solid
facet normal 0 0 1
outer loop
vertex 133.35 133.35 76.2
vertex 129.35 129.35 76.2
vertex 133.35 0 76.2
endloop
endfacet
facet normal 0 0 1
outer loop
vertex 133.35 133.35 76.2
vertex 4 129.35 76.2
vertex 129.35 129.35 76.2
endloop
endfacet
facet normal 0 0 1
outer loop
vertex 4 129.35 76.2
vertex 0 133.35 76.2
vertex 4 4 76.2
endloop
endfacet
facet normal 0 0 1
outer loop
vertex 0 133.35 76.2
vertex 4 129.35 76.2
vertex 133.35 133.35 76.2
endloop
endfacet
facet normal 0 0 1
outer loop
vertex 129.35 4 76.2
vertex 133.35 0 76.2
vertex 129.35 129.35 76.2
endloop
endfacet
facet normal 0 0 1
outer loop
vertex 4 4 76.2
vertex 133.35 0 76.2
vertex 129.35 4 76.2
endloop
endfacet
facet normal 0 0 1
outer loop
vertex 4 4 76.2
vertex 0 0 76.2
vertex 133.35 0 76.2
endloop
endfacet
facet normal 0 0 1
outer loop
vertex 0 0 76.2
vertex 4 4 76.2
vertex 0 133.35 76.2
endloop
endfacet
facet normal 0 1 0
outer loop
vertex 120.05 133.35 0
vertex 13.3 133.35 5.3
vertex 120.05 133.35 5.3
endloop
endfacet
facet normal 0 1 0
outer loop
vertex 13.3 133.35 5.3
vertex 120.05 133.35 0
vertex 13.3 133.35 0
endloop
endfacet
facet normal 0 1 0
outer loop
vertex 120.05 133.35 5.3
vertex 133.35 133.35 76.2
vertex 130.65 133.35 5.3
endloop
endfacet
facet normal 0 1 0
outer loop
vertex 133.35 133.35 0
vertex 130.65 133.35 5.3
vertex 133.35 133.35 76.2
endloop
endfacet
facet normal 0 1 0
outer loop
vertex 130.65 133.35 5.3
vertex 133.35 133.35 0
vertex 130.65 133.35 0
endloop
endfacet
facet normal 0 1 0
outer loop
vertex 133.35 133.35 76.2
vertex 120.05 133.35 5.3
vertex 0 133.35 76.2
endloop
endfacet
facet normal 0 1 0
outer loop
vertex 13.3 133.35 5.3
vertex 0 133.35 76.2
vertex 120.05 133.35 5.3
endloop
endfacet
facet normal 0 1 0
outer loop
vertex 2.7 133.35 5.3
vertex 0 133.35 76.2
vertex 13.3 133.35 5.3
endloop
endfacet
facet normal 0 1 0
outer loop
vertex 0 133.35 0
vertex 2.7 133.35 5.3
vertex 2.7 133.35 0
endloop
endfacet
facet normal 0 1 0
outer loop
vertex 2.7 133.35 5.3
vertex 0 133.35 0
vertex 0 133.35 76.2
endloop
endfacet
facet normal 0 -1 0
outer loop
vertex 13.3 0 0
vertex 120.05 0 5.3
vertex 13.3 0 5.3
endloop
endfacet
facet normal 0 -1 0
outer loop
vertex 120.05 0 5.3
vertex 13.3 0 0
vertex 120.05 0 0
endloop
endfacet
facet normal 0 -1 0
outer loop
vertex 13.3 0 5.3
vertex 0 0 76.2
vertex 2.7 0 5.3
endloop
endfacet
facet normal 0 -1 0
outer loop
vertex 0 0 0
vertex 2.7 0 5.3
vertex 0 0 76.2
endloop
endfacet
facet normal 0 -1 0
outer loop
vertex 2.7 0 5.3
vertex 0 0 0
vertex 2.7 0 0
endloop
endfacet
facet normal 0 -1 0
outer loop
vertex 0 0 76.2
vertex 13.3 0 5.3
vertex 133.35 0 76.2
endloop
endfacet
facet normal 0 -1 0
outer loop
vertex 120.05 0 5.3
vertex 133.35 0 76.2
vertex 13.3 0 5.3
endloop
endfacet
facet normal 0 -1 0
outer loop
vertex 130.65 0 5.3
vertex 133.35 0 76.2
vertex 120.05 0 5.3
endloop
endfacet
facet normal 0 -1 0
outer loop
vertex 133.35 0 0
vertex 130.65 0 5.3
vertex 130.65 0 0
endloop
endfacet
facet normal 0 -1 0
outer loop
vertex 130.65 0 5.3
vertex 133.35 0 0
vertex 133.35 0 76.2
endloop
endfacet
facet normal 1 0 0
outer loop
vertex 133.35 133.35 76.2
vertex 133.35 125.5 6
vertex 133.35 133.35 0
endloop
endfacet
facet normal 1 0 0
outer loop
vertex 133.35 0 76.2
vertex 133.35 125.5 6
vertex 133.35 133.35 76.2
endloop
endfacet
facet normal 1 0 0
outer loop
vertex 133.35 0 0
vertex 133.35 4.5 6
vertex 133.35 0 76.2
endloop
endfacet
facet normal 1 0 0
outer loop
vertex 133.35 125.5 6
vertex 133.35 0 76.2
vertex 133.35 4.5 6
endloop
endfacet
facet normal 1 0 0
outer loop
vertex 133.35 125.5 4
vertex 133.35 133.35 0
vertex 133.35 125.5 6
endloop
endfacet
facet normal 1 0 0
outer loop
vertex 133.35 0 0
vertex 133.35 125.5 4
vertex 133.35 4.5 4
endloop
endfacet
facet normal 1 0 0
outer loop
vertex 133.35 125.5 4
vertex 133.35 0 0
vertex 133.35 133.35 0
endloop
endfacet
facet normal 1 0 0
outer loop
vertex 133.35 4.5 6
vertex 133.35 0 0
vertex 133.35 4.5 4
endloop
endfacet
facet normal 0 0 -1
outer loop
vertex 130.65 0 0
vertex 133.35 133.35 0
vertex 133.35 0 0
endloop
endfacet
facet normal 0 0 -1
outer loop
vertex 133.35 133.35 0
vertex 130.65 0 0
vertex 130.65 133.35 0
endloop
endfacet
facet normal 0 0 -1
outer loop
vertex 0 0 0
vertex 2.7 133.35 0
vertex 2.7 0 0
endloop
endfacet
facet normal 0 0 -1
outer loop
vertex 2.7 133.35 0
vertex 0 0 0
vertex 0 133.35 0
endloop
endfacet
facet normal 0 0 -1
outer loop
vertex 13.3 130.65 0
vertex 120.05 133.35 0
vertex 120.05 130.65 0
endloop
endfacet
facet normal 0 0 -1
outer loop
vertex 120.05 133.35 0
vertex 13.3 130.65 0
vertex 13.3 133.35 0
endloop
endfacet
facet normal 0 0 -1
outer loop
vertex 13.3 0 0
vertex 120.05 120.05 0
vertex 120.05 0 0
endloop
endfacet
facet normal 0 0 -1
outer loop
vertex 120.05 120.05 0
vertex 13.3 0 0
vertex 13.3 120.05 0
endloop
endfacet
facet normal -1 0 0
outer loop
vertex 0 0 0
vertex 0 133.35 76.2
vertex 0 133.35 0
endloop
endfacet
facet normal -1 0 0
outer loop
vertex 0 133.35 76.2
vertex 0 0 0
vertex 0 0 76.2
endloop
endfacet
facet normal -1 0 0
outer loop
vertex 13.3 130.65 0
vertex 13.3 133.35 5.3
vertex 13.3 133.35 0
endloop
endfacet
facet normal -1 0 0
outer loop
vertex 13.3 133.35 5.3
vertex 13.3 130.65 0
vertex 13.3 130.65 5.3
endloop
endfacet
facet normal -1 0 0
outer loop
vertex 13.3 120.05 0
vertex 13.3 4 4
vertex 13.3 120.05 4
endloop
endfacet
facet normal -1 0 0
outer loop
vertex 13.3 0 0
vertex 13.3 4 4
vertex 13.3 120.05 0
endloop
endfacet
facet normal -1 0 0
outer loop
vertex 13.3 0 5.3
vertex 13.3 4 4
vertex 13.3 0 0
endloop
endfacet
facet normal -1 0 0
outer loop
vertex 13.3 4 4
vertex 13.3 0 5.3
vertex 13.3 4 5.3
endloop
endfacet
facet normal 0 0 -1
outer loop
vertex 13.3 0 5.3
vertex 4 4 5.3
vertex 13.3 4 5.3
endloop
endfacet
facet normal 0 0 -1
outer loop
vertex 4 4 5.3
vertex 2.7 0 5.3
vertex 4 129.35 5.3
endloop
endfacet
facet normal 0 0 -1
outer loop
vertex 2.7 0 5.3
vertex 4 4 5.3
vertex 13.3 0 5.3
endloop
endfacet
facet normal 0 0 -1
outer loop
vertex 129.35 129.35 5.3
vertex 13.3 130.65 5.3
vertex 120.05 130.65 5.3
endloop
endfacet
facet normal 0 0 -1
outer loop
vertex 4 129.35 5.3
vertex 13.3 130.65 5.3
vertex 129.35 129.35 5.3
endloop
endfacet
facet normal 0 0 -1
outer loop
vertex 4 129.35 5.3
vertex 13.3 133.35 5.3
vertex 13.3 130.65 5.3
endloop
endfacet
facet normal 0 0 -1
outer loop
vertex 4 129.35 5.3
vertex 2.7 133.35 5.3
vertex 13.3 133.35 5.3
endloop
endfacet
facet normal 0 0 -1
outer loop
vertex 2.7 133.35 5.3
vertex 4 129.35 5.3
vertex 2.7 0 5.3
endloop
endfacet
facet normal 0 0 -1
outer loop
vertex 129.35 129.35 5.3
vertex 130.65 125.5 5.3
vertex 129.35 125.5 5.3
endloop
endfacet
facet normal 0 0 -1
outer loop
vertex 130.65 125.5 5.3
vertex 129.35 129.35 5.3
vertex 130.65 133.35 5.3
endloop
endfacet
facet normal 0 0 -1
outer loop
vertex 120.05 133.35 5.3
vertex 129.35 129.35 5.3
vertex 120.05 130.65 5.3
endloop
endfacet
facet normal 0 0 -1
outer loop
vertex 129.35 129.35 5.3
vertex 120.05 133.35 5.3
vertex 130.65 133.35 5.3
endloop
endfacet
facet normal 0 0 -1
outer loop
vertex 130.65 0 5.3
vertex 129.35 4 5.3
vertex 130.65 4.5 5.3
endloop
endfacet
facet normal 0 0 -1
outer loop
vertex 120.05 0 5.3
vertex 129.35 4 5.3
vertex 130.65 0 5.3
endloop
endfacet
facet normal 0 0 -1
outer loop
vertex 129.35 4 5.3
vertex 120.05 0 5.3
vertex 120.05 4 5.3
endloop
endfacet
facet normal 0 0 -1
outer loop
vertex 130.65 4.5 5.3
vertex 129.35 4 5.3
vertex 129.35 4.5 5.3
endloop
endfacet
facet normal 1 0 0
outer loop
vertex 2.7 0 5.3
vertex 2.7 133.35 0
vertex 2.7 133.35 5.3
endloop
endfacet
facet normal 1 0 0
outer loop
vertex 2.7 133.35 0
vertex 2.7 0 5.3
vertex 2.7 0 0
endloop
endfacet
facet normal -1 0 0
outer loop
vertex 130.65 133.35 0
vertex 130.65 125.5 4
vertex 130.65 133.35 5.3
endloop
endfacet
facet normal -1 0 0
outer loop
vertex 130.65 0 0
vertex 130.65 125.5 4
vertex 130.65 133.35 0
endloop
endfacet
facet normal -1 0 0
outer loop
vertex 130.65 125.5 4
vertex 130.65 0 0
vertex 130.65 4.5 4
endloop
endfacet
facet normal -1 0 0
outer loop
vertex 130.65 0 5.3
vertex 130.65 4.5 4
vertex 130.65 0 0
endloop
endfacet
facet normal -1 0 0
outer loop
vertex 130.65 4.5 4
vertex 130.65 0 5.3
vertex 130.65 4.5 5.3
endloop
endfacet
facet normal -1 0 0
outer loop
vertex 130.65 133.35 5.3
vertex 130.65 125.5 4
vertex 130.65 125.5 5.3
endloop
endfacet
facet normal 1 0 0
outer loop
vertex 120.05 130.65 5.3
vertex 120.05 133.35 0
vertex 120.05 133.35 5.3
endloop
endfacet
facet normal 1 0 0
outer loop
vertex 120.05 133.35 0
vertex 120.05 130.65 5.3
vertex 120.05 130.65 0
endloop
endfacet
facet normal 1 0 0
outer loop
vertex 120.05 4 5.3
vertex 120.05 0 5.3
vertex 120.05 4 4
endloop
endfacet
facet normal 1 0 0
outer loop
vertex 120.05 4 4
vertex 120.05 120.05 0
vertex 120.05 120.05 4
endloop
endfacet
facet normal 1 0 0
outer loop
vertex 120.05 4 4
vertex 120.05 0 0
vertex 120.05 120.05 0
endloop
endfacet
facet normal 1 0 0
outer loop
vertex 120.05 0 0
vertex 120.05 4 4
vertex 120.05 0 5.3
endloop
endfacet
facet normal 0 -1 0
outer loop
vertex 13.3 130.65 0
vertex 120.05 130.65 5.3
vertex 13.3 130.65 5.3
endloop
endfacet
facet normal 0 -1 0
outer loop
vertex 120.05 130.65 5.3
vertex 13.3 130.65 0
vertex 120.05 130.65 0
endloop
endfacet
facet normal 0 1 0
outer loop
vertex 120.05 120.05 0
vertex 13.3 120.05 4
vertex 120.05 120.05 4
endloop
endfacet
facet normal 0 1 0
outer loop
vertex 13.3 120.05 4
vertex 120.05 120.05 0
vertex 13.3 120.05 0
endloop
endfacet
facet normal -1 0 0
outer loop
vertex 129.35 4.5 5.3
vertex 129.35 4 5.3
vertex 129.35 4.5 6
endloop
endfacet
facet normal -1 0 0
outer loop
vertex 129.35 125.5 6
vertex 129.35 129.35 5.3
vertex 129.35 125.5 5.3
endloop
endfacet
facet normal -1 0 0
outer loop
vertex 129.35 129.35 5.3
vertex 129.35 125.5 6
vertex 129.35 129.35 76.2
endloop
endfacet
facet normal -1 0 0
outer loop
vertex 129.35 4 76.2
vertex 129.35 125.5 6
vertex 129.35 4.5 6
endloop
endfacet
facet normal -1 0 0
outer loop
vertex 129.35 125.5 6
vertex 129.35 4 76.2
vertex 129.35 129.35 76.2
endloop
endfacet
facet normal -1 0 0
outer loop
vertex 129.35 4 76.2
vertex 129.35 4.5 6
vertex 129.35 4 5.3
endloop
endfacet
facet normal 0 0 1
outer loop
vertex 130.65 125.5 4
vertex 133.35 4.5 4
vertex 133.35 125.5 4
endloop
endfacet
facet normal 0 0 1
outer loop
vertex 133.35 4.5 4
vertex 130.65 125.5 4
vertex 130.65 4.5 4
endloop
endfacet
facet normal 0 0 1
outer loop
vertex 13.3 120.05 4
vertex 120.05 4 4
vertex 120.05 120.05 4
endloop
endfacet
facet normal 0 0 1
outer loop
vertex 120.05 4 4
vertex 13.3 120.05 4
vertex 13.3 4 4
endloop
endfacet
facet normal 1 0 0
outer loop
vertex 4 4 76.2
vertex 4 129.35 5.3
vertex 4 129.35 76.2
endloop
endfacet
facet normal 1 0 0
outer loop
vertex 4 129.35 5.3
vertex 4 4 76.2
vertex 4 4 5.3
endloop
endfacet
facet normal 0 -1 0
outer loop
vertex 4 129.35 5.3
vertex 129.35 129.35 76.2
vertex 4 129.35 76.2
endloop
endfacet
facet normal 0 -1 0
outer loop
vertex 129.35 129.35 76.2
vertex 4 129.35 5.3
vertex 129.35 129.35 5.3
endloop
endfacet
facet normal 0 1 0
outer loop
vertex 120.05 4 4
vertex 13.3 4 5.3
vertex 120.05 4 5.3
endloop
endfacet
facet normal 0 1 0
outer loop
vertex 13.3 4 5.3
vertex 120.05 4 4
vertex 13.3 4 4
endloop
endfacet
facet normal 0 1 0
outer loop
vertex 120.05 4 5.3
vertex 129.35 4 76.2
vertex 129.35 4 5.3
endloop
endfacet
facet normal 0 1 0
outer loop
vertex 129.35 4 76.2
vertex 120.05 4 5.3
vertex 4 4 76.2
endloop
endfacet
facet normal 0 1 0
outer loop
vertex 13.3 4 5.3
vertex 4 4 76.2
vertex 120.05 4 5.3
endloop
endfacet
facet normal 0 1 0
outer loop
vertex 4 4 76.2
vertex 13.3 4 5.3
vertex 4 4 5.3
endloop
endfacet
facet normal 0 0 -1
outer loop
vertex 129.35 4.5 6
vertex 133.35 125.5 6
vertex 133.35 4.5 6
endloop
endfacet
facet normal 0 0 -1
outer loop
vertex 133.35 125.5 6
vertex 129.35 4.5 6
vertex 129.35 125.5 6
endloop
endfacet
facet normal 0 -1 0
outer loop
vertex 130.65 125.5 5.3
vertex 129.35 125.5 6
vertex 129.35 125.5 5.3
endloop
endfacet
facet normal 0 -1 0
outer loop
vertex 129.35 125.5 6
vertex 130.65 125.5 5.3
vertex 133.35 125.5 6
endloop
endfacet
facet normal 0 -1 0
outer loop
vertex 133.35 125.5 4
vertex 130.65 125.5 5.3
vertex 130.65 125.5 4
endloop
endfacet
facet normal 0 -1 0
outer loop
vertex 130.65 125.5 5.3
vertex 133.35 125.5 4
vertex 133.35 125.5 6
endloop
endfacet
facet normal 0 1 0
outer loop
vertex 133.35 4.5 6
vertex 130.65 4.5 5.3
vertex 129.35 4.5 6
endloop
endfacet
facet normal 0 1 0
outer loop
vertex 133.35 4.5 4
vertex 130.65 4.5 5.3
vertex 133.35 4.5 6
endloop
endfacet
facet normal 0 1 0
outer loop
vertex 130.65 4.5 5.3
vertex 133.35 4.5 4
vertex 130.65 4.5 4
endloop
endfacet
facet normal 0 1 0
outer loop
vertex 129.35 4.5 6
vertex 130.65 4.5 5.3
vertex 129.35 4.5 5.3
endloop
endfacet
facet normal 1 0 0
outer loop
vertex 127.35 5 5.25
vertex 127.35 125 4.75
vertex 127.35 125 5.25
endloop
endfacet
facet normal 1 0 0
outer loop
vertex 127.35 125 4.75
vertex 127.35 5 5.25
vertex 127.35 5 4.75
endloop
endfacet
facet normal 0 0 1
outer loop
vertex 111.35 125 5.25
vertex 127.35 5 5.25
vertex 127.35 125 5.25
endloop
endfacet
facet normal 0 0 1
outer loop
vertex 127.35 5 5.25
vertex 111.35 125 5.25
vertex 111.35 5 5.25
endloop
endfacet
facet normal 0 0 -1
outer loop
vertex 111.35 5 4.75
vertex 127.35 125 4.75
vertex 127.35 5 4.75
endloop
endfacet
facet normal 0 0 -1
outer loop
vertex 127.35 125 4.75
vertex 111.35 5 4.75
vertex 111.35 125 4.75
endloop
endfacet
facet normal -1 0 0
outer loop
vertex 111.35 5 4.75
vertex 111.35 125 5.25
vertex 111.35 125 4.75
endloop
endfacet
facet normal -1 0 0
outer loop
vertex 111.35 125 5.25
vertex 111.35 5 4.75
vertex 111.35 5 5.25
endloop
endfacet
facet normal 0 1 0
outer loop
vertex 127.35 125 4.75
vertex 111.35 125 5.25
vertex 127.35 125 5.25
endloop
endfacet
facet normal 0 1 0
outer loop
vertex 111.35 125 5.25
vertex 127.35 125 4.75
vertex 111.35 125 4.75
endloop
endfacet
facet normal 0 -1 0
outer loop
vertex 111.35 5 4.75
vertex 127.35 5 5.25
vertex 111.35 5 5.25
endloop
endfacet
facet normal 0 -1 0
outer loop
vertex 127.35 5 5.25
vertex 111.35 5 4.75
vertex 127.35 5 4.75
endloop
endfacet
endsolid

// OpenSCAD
/* [Box Dimensions] */
// Width and height of the box face (mm)
box_size = 133.35; // 5.25 inches = 133.35 mm
// Depth of the box (mm)
box_depth = 76.2; // 3 inches = 76.2 mm
// Thickness of the box walls (mm)
wall_thickness = 4;

/* [Card Slot] */
// Width of the card to insert (mm)
card_width = 120;
// Height of the card slot (mm)
card_slot_height = 2;
// Depth of the card slot (how far it extends into the box) (mm)
card_slot_depth = 20;
// Clearance for the card (makes the slot slightly larger) (mm)
card_clearance = 0.5;

/* [Connection System] */
// Enable interlocking system
enable_interlocking = true;
// Inset from edge for the lip/indentation (mm)
lip_inset = 3;
// Height of the lip for vertical stacking (mm)
lip_height = 5;
// Clearance for the connections (mm)
connection_clearance = 0.3;
// Width of the lip on each side (mm)
lip_width = 10;

/* [Display Options] */
// Show example card in the slot
show_example_card = true;
// Show the box with transparency
transparent_view = false;
// Show boxes stacked in a demo (0=none, 1=horizontal, 2=vertical, 3=both)
stacking_demo = 0;

/* [Hidden] */
// Small value for ensuring proper differences and unions
epsilon = 0.01;

// Main box module
module periodic_element_box() {
    color(transparent_view ? "LightGreen" : "Green", transparent_view ? 0.5 : 1)
    difference() {
        union() {
            // Outer box
            cube([box_size, box_size, box_depth]);
            
            // Add interlocking lip system if enabled
            if (enable_interlocking) {
                // Left side lip
                translate([lip_inset, 0, box_depth - lip_height])
                    cube([lip_width, box_size, lip_height]);
                
                // Right side lip
                translate([box_size - lip_inset - lip_width, 0, box_depth - lip_height])
                    cube([lip_width, box_size, lip_height]);
                
                // Back side lip (adjust position to avoid interfering with other lips)
                translate([lip_inset + lip_width, box_size - lip_inset - lip_width, box_depth - lip_height])
                    cube([box_size - 2*(lip_inset + lip_width), lip_width, lip_height]);
            }
        }
        
        // Inner hollow space (leaving wall thickness on all sides)
        translate([wall_thickness, wall_thickness, wall_thickness])
            cube([
                box_size - 2 * wall_thickness, 
                box_size - 2 * wall_thickness, 
                box_depth - wall_thickness + epsilon
            ]);
        
        // Front opening
        translate([wall_thickness, wall_thickness, wall_thickness])
            cube([
                box_size - 2 * wall_thickness, 
                wall_thickness + epsilon, 
                box_depth - wall_thickness
            ]);
        
        // Card slot on right side face, positioned closer to back
        translate([
            box_size - wall_thickness,  // Right face
            wall_thickness + card_clearance,  // Closer to the back wall
            wall_thickness  // Center vertically
        ])
            cube([
                wall_thickness + epsilon,  // Cut through side wall
                card_width + card_clearance * 2,  // Width of slot
                card_slot_height  // Height of slot
            ]);
            
        // Horizontal card channel inside, aligned with new slot position
        translate([
            box_size - wall_thickness - card_slot_depth,  // Extend inward from right face
            wall_thickness + card_clearance,  // Match slot position closer to back
            wall_thickness  // Same vertical position
        ])
            cube([
                card_slot_depth,  // How deep the channel goes
                card_width + card_clearance * 2,  // Same width as slot
                card_slot_height  // Same height as slot
            ]);
        
        // Add indentations for interlocking with box below
        if (enable_interlocking) {
            // Left side indentation
            translate([lip_inset - connection_clearance, -epsilon, 0])
                cube([
                    lip_width + 2*connection_clearance, 
                    box_size + 2*epsilon, 
                    lip_height + connection_clearance
                ]);
            
            // Right side indentation
            translate([box_size - lip_inset - lip_width - connection_clearance, -epsilon, 0])
                cube([
                    lip_width + 2*connection_clearance, 
                    box_size + 2*epsilon, 
                    lip_height + connection_clearance
                ]);
            
            // Back side indentation
            translate([lip_inset + lip_width - connection_clearance, 
                      box_size - lip_inset - lip_width - connection_clearance, 
                      0])
                cube([
                    box_size - 2*(lip_inset + lip_width) + 2*connection_clearance, 
                    lip_width + 2*connection_clearance, 
                    lip_height + connection_clearance
                ]);
        }
    }
}

// Example card to show in the slot
module example_card() {
    if (show_example_card) {
        color("LightBlue", 0.7)
        translate([
            box_size - wall_thickness - card_slot_depth/2, 
            wall_thickness + card_clearance + (card_width + card_clearance*2)/2, 
            wall_thickness + card_slot_height/2
        ])
            cube([card_slot_depth * 0.8, card_width, 0.5], center=true);
    }
}

// Module to demonstrate boxes stacked horizontally (side by side)
module horizontal_stack_demo() {
    periodic_element_box();
    example_card();
    
    translate([box_size, 0, 0]) {
        periodic_element_box();
        example_card();
    }
}

// Module to demonstrate boxes stacked vertically (on top of each other)
module vertical_stack_demo() {
    periodic_element_box();
    example_card();
    
    translate([0, 0, box_depth]) {
        periodic_element_box();
        example_card();
    }
}

// Module to demonstrate boxes stacked both horizontally and vertically
module grid_stack_demo() {
    periodic_element_box();
    example_card();
    
    translate([box_size, 0, 0]) {
        periodic_element_box();
        example_card();
    }
    
    translate([0, 0, box_depth]) {
        periodic_element_box();
        example_card();
    }
    
    translate([box_size, 0, box_depth]) {
        periodic_element_box();
        example_card();
    }
}

// Render based on demo selection
if (stacking_demo == 1) {
    horizontal_stack_demo();
} else if (stacking_demo == 2) {
    vertical_stack_demo();
} else if (stacking_demo == 3) {
    grid_stack_demo();
} else {
    // Default view of single box
    periodic_element_box();
    example_card();
}
